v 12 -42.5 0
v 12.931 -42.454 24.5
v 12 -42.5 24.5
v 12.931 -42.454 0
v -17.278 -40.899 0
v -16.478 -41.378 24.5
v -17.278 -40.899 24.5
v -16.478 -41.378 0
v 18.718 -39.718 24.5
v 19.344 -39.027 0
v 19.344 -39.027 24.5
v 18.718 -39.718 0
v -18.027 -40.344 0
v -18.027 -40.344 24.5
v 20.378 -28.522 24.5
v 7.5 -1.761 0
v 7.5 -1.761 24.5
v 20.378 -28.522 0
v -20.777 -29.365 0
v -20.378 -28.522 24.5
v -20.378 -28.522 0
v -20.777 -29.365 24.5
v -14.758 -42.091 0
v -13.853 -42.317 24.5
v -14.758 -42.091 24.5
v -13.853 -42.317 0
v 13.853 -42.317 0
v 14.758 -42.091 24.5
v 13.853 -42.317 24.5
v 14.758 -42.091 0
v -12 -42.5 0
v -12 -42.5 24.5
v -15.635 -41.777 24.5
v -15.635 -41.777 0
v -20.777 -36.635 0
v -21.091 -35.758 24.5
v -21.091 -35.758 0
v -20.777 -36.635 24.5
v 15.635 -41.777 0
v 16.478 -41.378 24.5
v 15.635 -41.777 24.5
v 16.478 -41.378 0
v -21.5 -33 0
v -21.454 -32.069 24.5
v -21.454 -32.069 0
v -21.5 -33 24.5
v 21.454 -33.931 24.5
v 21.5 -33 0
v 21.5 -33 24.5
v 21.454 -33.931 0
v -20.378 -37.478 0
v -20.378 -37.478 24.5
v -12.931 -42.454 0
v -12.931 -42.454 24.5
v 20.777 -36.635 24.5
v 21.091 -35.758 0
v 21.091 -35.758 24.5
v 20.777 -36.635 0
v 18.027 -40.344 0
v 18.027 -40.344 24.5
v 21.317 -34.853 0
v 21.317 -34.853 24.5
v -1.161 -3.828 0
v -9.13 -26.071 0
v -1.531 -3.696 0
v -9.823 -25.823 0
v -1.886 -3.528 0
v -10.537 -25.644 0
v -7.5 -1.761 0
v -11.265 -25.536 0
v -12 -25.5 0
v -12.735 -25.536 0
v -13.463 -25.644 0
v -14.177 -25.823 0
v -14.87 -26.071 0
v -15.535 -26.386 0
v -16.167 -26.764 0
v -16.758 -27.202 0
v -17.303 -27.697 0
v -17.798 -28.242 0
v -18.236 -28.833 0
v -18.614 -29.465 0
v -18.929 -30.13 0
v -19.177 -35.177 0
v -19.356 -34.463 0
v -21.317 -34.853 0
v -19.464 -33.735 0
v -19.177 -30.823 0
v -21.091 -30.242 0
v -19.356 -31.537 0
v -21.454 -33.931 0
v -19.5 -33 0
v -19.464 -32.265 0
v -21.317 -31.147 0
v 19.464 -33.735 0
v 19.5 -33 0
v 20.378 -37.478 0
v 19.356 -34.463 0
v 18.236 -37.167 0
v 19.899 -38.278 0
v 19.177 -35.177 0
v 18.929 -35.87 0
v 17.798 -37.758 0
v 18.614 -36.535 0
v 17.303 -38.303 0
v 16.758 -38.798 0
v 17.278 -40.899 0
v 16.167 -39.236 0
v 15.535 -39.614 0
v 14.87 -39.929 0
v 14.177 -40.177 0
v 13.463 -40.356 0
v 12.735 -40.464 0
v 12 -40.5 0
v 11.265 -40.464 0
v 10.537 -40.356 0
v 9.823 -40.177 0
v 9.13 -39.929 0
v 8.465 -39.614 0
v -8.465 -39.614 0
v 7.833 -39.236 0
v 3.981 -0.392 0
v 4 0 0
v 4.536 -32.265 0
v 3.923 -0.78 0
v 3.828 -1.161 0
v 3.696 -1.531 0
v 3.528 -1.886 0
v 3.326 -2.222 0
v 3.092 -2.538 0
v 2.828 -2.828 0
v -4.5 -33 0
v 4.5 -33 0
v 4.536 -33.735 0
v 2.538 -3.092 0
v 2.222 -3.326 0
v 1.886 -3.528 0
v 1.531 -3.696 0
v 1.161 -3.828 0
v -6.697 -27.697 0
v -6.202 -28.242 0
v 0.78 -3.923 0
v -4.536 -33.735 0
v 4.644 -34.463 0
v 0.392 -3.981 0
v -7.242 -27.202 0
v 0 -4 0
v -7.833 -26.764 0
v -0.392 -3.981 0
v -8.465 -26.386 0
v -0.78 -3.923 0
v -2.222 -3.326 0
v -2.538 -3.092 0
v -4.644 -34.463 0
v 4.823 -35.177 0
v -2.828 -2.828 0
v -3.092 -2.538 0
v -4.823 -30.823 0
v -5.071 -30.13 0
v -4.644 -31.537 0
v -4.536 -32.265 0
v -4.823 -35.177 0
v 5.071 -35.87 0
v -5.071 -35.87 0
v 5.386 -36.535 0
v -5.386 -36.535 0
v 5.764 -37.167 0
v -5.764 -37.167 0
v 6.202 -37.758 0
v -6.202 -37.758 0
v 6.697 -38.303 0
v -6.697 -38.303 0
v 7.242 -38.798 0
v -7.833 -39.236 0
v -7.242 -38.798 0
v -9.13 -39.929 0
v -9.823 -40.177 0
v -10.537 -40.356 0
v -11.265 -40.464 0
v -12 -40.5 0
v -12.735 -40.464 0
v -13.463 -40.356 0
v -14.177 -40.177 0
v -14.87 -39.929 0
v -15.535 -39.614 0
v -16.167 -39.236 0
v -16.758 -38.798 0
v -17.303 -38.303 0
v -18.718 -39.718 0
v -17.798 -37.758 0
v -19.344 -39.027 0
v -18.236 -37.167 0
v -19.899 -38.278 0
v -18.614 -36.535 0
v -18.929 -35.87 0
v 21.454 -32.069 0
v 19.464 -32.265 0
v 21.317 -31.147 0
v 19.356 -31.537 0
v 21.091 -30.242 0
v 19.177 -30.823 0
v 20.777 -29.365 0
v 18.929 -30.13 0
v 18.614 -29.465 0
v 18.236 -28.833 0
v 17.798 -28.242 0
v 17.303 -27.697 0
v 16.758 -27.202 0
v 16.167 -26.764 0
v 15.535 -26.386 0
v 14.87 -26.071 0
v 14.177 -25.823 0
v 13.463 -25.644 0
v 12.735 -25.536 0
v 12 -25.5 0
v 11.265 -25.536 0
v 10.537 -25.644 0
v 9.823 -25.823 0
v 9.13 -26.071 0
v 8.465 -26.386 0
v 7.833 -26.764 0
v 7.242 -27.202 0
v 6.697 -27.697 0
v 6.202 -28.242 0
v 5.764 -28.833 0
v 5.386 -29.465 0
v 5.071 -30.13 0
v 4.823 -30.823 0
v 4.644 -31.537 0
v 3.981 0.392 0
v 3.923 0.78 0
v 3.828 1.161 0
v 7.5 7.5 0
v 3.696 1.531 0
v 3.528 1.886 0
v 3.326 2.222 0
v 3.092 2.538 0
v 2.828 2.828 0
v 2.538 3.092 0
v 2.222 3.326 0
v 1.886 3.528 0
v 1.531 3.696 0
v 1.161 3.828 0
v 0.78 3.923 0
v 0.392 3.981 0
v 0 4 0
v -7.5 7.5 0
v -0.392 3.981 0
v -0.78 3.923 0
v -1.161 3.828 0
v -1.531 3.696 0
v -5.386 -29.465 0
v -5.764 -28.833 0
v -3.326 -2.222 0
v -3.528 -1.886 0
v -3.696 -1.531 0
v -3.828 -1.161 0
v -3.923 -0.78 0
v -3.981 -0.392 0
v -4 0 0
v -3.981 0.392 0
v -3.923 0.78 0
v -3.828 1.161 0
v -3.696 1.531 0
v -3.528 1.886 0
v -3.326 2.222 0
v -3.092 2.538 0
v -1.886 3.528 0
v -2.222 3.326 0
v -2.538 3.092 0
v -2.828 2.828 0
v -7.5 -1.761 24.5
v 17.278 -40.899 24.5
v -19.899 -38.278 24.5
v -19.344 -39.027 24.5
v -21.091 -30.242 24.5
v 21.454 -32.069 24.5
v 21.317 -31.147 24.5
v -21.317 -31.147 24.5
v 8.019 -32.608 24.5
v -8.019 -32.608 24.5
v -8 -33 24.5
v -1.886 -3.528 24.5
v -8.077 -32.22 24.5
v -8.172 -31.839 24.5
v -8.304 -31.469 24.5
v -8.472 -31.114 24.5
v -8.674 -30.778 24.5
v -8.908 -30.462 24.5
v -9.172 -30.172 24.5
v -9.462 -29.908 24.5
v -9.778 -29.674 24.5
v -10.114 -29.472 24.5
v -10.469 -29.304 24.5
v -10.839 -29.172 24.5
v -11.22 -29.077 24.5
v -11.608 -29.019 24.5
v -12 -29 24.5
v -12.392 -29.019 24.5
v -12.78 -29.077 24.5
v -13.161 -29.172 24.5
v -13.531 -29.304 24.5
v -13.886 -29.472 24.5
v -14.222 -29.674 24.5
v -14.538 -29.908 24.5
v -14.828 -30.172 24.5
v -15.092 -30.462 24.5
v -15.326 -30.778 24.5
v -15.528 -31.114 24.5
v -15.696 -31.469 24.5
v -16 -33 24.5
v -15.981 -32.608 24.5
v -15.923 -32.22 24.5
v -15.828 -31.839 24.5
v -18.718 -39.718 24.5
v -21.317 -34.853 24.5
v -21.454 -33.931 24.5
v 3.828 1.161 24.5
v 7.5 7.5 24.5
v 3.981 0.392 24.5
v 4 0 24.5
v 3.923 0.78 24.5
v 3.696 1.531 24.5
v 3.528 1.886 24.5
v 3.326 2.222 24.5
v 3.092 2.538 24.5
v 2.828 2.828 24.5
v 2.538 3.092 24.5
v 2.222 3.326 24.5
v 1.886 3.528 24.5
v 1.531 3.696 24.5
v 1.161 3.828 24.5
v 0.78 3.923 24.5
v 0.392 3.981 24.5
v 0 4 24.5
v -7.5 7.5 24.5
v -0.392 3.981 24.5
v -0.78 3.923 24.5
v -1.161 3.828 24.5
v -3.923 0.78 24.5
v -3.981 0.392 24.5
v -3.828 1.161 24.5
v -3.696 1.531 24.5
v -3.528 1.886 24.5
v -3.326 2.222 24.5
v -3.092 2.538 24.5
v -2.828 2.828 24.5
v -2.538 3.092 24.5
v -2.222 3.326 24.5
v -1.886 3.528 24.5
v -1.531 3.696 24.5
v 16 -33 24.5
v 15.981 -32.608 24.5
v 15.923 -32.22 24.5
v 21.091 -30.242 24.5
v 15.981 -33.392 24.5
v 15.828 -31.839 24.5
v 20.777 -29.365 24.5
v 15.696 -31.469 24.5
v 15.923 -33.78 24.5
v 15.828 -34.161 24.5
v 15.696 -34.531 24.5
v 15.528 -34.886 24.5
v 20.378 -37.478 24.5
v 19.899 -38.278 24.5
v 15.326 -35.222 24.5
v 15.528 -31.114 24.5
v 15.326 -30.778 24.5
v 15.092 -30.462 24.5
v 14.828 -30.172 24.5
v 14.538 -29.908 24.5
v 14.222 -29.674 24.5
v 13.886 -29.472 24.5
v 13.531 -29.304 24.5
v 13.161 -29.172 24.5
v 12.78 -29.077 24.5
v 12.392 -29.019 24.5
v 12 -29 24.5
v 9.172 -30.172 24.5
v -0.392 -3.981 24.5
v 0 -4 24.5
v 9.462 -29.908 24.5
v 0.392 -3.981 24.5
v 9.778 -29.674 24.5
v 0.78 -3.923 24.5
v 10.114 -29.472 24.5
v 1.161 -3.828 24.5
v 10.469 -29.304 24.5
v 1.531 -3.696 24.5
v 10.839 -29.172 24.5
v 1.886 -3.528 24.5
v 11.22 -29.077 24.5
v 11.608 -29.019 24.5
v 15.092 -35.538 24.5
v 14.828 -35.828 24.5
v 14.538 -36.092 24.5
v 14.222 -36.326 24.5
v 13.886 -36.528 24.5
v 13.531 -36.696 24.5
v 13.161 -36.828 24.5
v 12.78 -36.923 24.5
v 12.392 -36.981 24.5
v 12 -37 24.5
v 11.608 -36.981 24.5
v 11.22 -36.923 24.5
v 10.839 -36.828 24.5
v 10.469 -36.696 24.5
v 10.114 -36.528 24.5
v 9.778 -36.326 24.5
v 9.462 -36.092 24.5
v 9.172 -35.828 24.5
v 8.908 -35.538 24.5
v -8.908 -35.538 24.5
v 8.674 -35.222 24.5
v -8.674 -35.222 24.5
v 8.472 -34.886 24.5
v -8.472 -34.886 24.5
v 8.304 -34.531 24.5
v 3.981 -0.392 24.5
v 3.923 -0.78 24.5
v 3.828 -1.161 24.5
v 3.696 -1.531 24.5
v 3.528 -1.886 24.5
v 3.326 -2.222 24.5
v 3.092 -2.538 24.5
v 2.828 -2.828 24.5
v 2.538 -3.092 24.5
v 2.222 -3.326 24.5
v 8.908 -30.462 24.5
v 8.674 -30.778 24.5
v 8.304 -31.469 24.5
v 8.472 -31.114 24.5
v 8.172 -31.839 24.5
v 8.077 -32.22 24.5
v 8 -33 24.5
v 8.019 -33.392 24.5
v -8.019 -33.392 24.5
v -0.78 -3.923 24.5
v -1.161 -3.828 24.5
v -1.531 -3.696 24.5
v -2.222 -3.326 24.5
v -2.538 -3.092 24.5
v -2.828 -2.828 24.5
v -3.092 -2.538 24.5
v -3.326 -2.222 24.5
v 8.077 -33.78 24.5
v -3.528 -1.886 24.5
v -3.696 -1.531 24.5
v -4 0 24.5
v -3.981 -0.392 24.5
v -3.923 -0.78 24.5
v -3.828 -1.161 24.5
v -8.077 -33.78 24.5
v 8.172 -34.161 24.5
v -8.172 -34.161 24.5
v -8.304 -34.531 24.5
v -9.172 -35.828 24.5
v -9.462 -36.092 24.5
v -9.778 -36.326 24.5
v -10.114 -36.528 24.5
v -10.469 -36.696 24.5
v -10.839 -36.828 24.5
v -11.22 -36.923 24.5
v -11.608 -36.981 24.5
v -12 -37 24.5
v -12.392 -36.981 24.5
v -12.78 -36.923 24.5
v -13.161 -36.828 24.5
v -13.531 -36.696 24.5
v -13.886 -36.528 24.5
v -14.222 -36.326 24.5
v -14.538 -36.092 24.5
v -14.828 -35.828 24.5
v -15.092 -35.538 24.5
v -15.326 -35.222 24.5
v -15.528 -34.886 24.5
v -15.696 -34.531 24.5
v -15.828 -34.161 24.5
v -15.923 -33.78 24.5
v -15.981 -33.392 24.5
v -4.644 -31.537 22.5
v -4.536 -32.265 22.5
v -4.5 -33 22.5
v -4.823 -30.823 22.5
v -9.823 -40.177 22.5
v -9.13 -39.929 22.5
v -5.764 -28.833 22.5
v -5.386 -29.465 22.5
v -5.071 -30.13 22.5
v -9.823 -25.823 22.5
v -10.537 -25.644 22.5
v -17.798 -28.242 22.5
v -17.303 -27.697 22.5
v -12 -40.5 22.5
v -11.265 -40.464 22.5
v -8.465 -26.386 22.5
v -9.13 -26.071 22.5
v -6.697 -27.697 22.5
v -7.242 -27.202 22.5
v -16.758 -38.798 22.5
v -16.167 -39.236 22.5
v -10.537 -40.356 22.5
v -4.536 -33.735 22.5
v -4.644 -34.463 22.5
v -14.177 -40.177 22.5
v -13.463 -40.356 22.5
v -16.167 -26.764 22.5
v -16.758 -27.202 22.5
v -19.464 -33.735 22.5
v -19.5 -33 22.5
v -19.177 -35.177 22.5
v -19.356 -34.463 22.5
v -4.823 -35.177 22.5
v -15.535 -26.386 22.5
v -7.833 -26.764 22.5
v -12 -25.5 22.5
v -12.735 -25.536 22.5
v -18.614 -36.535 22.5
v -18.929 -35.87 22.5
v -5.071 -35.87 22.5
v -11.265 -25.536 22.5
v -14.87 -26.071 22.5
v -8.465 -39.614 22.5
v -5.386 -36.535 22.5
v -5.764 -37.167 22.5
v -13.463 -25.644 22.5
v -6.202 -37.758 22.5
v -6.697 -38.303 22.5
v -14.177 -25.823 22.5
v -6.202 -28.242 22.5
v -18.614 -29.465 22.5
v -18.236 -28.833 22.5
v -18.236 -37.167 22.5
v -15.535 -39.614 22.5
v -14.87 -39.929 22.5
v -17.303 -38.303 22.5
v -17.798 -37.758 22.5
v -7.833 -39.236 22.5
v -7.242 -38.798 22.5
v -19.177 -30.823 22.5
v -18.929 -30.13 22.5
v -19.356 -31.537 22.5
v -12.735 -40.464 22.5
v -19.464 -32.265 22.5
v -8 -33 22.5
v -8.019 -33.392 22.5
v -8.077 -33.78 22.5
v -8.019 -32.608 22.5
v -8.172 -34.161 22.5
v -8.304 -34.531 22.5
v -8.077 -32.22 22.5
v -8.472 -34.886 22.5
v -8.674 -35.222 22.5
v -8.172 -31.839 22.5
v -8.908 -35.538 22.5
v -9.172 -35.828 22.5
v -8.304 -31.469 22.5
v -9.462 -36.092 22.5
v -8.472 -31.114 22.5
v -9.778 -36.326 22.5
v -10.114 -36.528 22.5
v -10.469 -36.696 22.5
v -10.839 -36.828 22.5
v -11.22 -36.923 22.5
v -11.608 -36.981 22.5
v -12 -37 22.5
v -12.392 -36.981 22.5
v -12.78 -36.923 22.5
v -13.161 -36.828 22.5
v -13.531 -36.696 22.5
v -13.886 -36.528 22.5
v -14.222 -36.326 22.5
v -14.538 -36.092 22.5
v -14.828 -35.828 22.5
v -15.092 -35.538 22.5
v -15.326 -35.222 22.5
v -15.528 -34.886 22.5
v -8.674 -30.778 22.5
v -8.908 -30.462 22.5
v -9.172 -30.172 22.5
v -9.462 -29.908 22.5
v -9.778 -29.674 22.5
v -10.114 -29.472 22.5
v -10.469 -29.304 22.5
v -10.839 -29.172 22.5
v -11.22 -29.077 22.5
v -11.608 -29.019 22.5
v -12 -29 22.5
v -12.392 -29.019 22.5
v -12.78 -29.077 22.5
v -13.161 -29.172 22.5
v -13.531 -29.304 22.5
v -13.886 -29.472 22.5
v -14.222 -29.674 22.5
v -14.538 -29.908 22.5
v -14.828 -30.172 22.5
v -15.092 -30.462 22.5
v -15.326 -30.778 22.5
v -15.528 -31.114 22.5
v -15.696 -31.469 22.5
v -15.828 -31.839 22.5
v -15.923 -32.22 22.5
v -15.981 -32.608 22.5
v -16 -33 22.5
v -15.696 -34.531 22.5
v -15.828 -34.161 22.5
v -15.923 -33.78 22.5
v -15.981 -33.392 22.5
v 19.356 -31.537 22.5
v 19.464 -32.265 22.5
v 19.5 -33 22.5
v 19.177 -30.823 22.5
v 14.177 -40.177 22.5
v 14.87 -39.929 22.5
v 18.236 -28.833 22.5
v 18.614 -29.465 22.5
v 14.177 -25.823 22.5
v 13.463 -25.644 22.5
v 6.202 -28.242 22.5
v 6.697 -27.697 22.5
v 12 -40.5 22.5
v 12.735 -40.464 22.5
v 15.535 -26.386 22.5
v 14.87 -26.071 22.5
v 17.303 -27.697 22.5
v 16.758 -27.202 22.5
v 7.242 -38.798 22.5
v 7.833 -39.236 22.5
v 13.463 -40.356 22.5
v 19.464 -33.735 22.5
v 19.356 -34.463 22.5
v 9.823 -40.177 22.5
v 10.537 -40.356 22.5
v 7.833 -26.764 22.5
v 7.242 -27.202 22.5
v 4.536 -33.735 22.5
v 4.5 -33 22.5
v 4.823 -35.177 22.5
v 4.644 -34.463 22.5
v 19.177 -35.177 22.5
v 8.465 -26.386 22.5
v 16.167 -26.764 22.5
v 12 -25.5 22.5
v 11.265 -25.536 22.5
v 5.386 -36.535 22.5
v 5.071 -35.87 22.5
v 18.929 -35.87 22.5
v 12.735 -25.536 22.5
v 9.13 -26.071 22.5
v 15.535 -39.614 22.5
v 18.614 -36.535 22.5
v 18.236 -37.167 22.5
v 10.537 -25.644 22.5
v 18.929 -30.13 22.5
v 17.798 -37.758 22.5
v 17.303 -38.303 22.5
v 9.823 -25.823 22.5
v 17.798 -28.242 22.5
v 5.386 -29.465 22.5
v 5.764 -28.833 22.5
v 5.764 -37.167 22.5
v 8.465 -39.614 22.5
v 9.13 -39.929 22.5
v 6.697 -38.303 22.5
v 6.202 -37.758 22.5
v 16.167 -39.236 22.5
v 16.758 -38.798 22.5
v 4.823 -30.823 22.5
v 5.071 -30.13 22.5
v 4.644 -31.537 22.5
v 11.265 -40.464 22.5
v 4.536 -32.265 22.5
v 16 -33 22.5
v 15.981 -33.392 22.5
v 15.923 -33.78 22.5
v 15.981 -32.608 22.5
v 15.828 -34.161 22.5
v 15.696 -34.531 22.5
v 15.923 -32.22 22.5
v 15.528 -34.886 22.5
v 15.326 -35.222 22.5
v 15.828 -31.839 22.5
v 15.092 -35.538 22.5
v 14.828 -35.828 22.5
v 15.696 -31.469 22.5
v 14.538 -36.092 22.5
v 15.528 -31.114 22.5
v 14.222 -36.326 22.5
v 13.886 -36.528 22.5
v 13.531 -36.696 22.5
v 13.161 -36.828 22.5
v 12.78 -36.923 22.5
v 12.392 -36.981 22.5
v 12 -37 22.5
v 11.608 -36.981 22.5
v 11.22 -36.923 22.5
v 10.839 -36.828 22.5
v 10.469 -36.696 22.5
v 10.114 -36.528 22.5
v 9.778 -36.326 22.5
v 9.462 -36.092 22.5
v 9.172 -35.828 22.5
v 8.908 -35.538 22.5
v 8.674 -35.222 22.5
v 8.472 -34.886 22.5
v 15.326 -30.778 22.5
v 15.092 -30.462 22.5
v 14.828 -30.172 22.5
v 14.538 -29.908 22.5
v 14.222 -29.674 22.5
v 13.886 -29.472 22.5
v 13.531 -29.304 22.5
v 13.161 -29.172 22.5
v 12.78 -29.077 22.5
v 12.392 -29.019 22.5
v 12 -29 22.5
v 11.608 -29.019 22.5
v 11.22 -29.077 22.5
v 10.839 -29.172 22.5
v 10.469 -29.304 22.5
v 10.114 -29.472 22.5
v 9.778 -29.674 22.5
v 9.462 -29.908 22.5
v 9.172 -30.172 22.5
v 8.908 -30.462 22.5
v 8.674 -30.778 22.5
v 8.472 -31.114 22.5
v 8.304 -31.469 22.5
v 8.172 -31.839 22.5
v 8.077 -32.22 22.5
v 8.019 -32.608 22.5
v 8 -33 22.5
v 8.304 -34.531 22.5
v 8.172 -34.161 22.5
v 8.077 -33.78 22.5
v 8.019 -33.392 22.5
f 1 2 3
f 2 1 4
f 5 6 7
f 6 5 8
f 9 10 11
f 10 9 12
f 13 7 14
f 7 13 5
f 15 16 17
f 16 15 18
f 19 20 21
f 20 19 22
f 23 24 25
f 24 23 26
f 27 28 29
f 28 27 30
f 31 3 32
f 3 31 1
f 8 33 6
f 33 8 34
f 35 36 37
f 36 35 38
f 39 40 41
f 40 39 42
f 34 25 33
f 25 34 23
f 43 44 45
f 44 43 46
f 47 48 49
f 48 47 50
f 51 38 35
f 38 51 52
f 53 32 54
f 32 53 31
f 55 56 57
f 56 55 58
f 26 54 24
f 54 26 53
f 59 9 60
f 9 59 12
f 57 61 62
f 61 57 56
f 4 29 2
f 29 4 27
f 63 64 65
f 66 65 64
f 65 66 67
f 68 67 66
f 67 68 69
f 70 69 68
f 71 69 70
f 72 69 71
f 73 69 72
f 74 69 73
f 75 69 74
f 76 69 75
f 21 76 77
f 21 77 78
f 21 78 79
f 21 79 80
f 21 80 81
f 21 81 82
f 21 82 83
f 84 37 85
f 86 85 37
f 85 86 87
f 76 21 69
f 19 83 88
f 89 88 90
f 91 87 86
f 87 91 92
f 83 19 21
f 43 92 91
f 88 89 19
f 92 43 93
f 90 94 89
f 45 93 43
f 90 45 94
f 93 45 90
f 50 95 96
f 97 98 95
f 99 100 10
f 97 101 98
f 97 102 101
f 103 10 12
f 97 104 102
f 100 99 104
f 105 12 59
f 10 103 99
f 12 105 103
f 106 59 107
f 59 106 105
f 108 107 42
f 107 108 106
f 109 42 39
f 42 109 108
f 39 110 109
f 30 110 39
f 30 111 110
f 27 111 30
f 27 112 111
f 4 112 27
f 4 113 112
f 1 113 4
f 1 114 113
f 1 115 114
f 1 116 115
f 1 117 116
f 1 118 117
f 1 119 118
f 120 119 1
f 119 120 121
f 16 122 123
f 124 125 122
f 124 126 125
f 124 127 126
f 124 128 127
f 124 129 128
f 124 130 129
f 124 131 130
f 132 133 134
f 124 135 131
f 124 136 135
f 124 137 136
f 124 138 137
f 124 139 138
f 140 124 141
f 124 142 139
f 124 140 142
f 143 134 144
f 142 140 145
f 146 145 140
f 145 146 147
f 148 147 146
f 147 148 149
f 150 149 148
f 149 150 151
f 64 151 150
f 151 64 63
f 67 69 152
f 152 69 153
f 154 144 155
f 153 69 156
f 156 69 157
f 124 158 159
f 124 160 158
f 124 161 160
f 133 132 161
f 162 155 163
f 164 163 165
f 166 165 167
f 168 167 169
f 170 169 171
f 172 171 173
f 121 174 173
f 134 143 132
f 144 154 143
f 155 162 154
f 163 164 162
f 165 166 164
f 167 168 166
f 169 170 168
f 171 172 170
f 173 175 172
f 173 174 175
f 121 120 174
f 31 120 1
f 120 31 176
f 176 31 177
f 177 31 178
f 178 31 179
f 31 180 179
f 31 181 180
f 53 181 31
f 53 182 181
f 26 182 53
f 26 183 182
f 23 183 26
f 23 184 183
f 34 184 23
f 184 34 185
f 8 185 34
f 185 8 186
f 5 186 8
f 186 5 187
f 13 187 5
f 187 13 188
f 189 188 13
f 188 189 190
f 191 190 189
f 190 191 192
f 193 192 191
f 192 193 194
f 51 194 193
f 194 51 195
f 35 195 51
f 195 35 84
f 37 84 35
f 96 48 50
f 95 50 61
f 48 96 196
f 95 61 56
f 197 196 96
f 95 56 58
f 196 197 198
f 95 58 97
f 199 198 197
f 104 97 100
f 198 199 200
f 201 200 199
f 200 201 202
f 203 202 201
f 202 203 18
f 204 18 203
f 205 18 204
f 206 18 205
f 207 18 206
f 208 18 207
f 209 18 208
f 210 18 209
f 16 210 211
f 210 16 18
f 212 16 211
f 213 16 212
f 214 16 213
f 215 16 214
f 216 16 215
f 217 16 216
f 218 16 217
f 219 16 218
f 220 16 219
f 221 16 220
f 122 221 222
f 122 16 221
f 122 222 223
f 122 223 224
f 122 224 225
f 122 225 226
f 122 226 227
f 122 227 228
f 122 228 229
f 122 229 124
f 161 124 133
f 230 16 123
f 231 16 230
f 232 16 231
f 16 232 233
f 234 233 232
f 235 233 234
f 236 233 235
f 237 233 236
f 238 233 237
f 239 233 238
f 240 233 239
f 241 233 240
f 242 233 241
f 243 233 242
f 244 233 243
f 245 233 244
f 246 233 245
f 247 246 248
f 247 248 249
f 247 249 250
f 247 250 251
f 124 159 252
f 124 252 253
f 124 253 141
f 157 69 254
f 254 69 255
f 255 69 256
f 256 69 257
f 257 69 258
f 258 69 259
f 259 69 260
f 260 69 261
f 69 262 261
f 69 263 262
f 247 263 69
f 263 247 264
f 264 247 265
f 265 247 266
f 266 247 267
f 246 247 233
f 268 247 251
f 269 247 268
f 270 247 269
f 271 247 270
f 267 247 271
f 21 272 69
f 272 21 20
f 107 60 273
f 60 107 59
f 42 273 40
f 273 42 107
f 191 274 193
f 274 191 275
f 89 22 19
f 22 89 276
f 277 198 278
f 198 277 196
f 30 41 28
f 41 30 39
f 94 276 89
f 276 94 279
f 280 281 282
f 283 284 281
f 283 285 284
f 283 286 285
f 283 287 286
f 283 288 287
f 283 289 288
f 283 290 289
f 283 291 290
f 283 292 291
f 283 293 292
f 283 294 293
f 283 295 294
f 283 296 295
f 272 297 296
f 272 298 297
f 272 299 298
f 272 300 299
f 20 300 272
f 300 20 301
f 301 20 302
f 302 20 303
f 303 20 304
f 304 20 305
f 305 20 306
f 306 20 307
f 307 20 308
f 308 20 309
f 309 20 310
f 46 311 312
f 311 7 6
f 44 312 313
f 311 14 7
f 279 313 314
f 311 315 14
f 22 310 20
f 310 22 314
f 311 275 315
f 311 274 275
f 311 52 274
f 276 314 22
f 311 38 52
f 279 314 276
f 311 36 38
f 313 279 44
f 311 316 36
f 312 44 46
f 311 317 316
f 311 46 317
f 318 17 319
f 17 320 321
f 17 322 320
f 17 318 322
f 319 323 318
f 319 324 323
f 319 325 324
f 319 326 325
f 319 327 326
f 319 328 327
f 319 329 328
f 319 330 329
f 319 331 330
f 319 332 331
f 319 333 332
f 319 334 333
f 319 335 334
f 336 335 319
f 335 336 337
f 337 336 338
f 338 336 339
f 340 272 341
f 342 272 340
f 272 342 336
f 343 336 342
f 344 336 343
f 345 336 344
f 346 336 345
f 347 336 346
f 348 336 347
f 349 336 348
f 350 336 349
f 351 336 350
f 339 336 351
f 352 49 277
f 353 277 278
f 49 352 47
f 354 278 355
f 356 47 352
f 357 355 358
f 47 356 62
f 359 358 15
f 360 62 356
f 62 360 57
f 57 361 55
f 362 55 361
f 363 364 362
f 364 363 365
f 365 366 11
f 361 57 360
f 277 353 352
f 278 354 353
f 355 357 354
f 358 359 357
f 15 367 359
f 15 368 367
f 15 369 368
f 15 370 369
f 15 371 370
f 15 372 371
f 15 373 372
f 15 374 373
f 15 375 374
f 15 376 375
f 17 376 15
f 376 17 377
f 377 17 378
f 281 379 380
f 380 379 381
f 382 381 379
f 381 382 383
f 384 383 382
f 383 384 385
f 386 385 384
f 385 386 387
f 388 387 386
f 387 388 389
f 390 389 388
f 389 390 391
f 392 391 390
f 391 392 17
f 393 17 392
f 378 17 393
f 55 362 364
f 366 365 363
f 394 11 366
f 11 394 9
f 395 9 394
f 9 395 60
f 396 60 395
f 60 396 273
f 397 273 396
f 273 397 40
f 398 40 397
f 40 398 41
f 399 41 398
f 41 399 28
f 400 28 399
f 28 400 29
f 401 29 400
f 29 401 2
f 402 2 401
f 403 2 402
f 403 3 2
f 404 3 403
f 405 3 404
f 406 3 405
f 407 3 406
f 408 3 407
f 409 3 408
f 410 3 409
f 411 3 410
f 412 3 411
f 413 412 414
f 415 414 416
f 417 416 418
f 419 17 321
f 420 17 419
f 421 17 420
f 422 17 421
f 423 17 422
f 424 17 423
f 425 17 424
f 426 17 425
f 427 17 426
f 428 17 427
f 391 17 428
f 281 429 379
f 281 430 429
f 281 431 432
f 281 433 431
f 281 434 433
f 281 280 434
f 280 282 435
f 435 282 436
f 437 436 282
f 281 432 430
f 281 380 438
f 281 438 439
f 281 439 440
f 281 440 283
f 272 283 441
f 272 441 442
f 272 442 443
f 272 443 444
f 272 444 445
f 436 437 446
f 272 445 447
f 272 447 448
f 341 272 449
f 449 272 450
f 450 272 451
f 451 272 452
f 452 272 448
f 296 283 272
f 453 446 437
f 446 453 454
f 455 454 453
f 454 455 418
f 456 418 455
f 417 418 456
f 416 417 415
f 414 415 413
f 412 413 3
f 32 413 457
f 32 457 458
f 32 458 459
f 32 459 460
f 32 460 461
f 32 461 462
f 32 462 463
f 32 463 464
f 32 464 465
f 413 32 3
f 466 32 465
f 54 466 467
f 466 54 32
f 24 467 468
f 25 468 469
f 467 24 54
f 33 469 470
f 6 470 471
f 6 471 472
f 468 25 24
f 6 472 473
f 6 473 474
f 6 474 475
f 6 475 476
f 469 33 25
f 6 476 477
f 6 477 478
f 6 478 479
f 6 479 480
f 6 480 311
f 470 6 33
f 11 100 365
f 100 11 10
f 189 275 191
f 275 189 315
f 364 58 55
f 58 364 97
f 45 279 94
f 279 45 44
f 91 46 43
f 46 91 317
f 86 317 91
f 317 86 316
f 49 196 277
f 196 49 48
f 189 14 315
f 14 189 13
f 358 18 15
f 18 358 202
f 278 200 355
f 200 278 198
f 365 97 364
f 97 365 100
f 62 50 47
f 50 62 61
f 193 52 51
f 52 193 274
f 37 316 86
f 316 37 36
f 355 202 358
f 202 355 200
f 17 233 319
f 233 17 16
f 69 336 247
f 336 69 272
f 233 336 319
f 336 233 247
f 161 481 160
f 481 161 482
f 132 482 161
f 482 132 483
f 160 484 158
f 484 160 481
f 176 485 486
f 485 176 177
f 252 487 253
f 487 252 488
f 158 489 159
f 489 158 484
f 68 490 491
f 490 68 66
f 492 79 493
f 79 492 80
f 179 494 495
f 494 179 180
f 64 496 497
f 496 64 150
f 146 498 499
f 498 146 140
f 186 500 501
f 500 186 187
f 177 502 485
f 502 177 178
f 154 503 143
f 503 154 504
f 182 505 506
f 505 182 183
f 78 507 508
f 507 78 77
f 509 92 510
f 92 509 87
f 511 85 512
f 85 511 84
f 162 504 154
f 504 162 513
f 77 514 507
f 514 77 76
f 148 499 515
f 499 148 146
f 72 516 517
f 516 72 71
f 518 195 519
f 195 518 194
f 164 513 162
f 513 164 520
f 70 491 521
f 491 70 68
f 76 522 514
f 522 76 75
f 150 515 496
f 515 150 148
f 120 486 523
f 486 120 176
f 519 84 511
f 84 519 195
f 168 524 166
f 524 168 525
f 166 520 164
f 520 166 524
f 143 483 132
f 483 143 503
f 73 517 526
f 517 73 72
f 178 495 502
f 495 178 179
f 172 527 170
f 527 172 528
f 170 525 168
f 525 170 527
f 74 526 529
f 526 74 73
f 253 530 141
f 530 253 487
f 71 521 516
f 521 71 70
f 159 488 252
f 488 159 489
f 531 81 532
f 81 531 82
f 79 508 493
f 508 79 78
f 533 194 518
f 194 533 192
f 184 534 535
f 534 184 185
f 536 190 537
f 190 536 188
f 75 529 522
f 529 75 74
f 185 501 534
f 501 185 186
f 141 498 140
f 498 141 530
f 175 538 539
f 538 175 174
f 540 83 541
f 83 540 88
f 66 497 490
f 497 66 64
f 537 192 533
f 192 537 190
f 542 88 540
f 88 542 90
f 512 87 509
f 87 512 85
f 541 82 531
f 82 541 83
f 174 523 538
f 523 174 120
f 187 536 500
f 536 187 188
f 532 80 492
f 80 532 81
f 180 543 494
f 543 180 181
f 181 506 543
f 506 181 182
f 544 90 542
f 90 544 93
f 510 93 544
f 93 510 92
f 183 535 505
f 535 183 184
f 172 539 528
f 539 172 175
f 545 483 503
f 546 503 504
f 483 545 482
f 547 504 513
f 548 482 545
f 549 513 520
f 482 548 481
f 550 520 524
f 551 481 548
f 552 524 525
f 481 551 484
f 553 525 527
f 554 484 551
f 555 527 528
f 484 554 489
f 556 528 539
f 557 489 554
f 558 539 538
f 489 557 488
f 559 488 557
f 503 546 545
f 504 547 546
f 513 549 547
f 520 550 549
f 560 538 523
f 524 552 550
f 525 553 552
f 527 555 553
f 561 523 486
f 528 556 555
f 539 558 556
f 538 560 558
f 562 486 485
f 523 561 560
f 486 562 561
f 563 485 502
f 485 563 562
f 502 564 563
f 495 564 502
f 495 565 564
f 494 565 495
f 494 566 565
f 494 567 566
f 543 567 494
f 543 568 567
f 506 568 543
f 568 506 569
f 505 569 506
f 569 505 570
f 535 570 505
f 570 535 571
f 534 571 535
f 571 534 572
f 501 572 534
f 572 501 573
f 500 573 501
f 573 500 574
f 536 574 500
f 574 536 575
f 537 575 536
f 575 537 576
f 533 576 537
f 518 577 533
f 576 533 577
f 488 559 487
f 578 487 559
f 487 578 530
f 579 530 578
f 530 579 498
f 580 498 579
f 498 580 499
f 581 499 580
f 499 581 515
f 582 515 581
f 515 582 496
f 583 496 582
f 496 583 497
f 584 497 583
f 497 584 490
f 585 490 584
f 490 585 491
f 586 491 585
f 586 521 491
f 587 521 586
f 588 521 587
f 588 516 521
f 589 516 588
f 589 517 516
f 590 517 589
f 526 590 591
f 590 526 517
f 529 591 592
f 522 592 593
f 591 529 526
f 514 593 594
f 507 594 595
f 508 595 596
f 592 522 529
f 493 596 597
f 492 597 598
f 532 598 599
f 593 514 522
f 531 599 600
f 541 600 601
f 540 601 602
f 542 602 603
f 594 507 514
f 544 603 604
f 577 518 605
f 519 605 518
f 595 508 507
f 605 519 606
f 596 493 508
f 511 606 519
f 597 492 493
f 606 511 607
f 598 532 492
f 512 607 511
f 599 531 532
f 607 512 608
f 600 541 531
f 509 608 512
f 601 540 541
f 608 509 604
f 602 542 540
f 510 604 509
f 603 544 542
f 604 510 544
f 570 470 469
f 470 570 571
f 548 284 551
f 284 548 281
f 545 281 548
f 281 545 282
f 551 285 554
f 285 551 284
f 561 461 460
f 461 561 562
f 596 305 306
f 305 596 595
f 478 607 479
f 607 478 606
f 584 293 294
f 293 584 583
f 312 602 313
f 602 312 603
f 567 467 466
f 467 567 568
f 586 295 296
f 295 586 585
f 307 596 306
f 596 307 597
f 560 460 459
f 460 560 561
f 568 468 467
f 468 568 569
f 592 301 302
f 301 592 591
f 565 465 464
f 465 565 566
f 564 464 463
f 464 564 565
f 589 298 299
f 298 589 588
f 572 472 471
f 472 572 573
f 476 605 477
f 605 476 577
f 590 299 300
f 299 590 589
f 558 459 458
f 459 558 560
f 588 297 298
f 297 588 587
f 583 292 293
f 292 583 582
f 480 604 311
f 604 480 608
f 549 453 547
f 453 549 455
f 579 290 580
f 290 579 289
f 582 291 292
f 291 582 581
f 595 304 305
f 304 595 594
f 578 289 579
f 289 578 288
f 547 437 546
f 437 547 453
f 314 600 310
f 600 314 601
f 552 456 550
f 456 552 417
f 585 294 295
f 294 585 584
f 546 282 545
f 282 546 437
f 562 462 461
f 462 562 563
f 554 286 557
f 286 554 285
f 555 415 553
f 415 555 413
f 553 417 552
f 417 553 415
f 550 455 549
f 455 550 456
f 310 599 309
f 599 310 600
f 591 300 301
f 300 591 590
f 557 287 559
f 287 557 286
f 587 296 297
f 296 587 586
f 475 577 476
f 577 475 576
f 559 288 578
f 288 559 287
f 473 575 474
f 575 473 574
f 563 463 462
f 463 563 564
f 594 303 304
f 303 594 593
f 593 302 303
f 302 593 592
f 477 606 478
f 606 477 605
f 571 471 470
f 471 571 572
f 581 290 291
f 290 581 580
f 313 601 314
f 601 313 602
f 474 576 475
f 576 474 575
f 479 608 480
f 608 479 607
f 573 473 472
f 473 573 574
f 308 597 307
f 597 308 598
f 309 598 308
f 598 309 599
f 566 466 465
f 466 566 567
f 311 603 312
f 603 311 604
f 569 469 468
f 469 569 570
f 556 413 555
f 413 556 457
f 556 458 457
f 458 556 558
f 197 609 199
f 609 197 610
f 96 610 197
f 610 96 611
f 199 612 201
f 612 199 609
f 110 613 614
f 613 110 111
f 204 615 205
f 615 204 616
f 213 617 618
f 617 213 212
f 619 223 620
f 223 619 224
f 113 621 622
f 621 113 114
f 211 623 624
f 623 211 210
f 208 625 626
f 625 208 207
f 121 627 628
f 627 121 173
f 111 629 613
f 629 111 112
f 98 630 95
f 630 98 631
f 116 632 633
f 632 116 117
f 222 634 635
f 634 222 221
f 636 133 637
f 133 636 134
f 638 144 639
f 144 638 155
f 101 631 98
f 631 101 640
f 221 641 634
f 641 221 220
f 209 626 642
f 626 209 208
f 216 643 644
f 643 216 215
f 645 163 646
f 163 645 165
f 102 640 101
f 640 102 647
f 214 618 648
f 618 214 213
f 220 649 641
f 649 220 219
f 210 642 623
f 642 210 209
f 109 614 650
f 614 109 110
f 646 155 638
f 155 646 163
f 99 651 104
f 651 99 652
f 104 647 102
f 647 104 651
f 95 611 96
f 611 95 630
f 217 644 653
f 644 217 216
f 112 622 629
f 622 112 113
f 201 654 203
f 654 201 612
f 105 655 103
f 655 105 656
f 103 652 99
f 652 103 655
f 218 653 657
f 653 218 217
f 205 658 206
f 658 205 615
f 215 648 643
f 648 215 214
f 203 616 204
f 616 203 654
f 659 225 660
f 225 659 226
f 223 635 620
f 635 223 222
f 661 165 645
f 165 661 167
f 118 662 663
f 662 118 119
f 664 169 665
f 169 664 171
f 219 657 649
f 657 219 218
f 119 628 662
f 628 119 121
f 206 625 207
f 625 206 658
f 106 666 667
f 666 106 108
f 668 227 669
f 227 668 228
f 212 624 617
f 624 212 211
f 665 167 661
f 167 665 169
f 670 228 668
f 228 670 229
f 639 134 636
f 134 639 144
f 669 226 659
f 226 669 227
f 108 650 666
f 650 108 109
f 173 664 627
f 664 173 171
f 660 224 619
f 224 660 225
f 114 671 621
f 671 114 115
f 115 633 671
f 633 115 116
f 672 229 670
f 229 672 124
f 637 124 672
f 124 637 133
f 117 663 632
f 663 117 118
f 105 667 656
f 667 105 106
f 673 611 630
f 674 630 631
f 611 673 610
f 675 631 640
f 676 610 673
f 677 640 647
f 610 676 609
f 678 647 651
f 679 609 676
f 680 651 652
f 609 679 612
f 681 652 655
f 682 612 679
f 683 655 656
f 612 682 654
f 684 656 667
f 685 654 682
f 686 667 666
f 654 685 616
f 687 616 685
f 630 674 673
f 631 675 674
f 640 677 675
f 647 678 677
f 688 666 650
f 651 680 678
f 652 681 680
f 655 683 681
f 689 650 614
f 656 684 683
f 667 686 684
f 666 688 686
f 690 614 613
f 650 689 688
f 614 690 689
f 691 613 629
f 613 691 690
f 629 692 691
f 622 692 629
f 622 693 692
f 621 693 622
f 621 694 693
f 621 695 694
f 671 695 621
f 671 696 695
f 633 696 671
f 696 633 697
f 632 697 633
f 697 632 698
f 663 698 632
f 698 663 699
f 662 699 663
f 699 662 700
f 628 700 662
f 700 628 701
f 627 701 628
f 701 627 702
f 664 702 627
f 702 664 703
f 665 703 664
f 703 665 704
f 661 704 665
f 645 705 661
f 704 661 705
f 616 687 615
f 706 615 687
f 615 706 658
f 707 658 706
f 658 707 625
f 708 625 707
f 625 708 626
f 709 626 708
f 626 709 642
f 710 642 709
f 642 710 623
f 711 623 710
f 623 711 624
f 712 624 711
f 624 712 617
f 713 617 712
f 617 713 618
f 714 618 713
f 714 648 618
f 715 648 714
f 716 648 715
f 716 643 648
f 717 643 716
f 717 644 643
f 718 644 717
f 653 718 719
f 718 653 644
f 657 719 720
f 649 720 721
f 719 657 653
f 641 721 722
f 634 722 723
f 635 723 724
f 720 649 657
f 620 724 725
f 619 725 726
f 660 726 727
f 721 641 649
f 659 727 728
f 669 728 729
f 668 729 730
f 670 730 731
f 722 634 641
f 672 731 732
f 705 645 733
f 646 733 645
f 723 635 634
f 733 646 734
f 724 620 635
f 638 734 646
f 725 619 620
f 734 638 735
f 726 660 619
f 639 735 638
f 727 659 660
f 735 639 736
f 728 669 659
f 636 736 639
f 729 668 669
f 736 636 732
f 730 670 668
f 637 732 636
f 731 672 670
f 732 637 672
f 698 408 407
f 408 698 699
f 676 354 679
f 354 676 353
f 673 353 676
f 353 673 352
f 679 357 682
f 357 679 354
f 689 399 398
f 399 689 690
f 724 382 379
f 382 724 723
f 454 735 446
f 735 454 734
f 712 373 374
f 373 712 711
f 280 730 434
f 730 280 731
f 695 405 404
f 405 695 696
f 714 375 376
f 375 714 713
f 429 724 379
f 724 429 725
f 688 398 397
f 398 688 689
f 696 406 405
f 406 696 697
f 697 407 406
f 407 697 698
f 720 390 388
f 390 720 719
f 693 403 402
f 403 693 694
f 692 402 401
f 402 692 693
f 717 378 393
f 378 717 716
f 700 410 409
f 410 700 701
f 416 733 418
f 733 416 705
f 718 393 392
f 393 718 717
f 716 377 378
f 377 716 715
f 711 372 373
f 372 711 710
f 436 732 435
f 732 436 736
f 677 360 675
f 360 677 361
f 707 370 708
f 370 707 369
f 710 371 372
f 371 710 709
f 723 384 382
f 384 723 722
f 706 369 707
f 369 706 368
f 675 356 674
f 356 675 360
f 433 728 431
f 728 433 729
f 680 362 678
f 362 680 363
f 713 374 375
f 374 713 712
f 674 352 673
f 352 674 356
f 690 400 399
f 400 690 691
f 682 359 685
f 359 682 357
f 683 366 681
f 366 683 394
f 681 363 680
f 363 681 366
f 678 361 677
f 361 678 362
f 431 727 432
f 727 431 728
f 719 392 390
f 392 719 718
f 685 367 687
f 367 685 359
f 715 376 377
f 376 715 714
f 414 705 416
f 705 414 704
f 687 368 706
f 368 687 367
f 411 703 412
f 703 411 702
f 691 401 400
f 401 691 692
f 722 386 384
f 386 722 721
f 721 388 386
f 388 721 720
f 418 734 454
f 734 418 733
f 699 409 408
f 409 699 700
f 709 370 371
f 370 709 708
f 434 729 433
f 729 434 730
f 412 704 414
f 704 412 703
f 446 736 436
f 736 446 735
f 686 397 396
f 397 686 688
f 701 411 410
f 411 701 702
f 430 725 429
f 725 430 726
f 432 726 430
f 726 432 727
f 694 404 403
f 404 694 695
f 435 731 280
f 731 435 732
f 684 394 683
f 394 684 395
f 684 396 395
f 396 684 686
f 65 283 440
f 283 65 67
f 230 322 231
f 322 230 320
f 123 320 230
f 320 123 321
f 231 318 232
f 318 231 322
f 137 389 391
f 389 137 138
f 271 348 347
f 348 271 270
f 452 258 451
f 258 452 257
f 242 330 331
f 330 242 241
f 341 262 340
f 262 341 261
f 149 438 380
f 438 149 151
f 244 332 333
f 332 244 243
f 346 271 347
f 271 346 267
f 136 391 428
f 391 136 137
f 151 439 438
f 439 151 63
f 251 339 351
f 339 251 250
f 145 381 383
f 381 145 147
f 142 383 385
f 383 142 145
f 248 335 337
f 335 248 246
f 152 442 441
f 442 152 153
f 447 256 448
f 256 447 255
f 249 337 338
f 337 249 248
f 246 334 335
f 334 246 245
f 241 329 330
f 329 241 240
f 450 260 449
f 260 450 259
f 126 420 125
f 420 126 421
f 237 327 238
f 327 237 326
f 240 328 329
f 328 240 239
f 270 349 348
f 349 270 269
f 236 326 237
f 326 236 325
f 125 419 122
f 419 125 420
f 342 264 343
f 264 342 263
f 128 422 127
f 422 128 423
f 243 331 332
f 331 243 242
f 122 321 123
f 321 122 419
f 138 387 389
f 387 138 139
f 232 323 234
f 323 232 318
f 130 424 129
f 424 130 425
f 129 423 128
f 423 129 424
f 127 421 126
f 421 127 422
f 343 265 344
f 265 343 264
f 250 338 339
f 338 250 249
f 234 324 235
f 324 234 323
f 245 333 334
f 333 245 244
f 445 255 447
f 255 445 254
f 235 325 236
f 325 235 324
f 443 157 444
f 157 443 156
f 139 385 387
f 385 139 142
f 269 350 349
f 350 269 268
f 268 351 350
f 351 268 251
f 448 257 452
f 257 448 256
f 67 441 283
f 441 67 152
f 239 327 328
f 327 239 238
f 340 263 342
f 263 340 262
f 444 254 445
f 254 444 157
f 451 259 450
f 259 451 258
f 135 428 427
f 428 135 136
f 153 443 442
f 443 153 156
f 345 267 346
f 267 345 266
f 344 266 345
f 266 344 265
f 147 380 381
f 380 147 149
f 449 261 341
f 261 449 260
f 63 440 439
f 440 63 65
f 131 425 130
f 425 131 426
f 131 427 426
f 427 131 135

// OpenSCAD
// file: variables.scad
//Universal 
$fn= $preview ? 32 : 64;
tolerance = 0.4; //play for EASY fit
wallThickness = 4;
cutOut = 0.2;

//dimention of extrusion aluminium profile
extrusionHeight = 40;
extrusionWidth = 20;
extrusionDepth = 50;

//extrusionSlotMetrics
extrusionSlotOffset = 6.9;
extrusionSlotWidth = 6.2;
extrusionSlotMid = 13.65;

//dimention of extrusion aluminium and walls
outerExtrusionHeight = extrusionHeight+wallThickness*2;
outerExtrusionWidth = extrusionWidth+wallThickness*2;
outerExtrusionDepth = extrusionDepth+wallThickness;

//Mounting bolts for extrusion
extrusionMountBoltDiameter = 4;

//bearings
zz608BearingOD = 22;
zz608BearingID = 8;
zz608BearingHeight = 7;

lm8luuOD = 15;
lm8luuID = 8;
lm8luuHeight = 45;

//inner support
frontSupportThickness = extrusionHeight/10;
innerSupportDifference = sqrt(2)*outerExtrusionDepth;

//outer support
outerSupportDifference = sqrt(2)*outerExtrusionWidth;

//stepper Motor
stepperMotorHight = 31;
stepperMotorWidth = 41;
stepperMotorScrewDiameter = 3;
stepperMotorShaftDiameter = 22;
stepperThreadOffset = 10;
stepperMotorMountThickness = 4;

//active working area dementions
axisLengthY = 500;
axisLengthX = 500;

//X axis gantry carriage
xCarriageWidth = outerExtrusionDepth;
xCarriageDepth = outerExtrusionWidth*2;
xCarriageHeight = outerExtrusionHeight;

xGantryLength = xCarriageWidth*2+axisLengthX+outerExtrusionDepth*2;

//Z tool carridge (tc)
tcThreadedRodDiamiter = 8;
tcThreadedRodOffset = tcThreadedRodDiamiter/2+wallThickness;
tcSmoothRodDiamiter = 8;
tcSmoothRodOffset = tcSmoothRodDiamiter/2+wallThickness;

tcLeadScrewDiamiter = 8;
tcLeadScrewNutWidth = 15;

toolCarridgePlateX = tcThreadedRodDiamiter*2+tcSmoothRodDiamiter*2+tcLeadScrewDiamiter+wallThickness*6;
toolCarridgePlateY = extrusionDepth;
toolCarridgePlateZ = wallThickness;

tcHeight = extrusionHeight+toolCarridgePlateZ*2+cutOut*2;

tcSmoothRodPlatformX = toolCarridgePlateX;
tcSmoothRodPlatformY = wallThickness*2+tcSmoothRodDiamiter;
tcSmoothRodPlatformZ = toolCarridgePlateZ;

tcLeadScrewBearingHousingX = wallThickness*2+tcLeadScrewDiamiter+tcSmoothRodDiamiter*2;
tcLeadScrewBearingHousingY = tcSmoothRodDiamiter >= tcLeadScrewDiamiter ? tcSmoothRodDiamiter+wallThickness*2:tcLeadScrewDiamiter+wallThickness*2;
tcLeadScrewBearingHousingZ = wallThickness;

toolHeadSlideHight = (lm8luuHeight+wallThickness)/2;
// main file
include <variables.scad>;

module tcThreadedRodLoop(){
	
	for (right = [-1,1]){
		
		for (left = [-1,1]){
			
		translate([right*(toolCarridgePlateX/2-tcThreadedRodOffset),left*(toolCarridgePlateY/2-tcThreadedRodOffset),(-toolCarridgePlateZ-cutOut)/2])
			
			cylinder(h=toolCarridgePlateZ+cutOut,d=tcThreadedRodDiamiter);
			
		}
	
	}
	
}

module tcSmoothRodPlatform(){
	
	difference(){
	
		translate([0,-toolCarridgePlateY/2-tcSmoothRodPlatformY/2,0]){
			cube([tcSmoothRodPlatformX,tcSmoothRodPlatformY,tcSmoothRodPlatformZ],true);
		}
	
		for (front = [-1,1]){
			
			translate([front*(tcSmoothRodOffset+wallThickness),-toolCarridgePlateY/2-tcSmoothRodPlatformY/2,(-toolCarridgePlateZ-cutOut)/2]){
			
				cylinder(h=toolCarridgePlateZ+cutOut,d=tcSmoothRodDiamiter);
			}
		
		}
	
	}
	
}

module tcLeadScrewHole(){
	
	translate([0,-toolCarridgePlateY/2+tcSmoothRodOffset,(-toolCarridgePlateZ-cutOut)/2]){
			
		cylinder(h=toolCarridgePlateZ+cutOut,d=tcLeadScrewDiamiter);
		
	}
	
}
	


module toolCarridgePlatePrimitive(){
	
	difference(){
		
		cube([toolCarridgePlateX,toolCarridgePlateY,toolCarridgePlateZ],true);
	
		tcThreadedRodLoop();
		
		tcLeadScrewHole();
		
	}
	
	tcSmoothRodPlatform();
	
}

module tcLeadScrewBearingHousing(){
	
	difference(){
		
		cube([tcLeadScrewBearingHousingX,tcLeadScrewBearingHousingY,tcLeadScrewBearingHousingZ],true);
		
		translate([0,0,-(tcLeadScrewBearingHousingZ+cutOut)/2]){
			
			cylinder(h=tcLeadScrewBearingHousingZ+cutOut,d=zz608BearingOD);
			
		}
		
	}
	
}	

module toolHeadSlideHalf(){
	difference(){
		union(){
			hull(){
				for (front = [-1,1]){
			
					translate([front*(tcSmoothRodOffset+wallThickness),-toolCarridgePlateY/2-tcSmoothRodPlatformY/2,0]){
			
						cylinder(h=toolHeadSlideHight, d=lm8luuOD+wallThickness);

					}
		
				}
			
				cylinder(h=toolHeadSlideHight, d=tcLeadScrewDiamiter+wallThickness);
		
			}
			translate([0,0,toolHeadSlideHight/2]){
				
				cube([tcLeadScrewNutWidth,tcLeadScrewNutWidth,toolHeadSlideHight],true);
			}
		}
		
		for (front = [-1,1]){
			
			translate([front*(tcSmoothRodOffset+wallThickness),-toolCarridgePlateY/2-tcSmoothRodPlatformY/2,0]){
			
				cylinder(h=lm8luuHeight/2, d=lm8luuOD);
						
				translate([0,0,toolHeadSlideHight-wallThickness/2]){
							
					cylinder(h=wallThickness/2+cutOut, d=tcSmoothRodDiamiter);
							
				}
				
			}
	
		}
		
		translate([0,0,-cutOut/2]){
			cylinder(h=toolHeadSlideHight+cutOut, d=tcLeadScrewDiamiter);
		}
		
	}
	
}


toolHeadSlideHalf();
//mirror([0,0,1])toolHeadSlideHalf();

module toolCarridgePlateBottom(){
	
	
		translate([0,(-toolCarridgePlateY+tcLeadScrewBearingHousingY)/2,-toolCarridgePlateZ+tcLeadScrewBearingHousingZ/2]){
			
			tcLeadScrewBearingHousing();
			
		}
		
		translate([0,0,toolCarridgePlateZ/2]){
		
			toolCarridgePlatePrimitive();
		
		}
		
	
	
}

module toolCarridgePlateTop(){
	
	
	
	translate([0,0,tcHeight-toolCarridgePlateZ/2]){
		
		toolCarridgePlatePrimitive();

		translate([0,(-toolCarridgePlateY+tcLeadScrewBearingHousingY)/2,toolCarridgePlateZ/2+tcLeadScrewBearingHousingZ/2]){
			
			tcLeadScrewBearingHousing();
			
		}
	}
	
}

module toolCarridge(){
	
	toolCarridgePlateTop();
	
	toolCarridgePlateBottom();
	
}

//toolCarridge();
